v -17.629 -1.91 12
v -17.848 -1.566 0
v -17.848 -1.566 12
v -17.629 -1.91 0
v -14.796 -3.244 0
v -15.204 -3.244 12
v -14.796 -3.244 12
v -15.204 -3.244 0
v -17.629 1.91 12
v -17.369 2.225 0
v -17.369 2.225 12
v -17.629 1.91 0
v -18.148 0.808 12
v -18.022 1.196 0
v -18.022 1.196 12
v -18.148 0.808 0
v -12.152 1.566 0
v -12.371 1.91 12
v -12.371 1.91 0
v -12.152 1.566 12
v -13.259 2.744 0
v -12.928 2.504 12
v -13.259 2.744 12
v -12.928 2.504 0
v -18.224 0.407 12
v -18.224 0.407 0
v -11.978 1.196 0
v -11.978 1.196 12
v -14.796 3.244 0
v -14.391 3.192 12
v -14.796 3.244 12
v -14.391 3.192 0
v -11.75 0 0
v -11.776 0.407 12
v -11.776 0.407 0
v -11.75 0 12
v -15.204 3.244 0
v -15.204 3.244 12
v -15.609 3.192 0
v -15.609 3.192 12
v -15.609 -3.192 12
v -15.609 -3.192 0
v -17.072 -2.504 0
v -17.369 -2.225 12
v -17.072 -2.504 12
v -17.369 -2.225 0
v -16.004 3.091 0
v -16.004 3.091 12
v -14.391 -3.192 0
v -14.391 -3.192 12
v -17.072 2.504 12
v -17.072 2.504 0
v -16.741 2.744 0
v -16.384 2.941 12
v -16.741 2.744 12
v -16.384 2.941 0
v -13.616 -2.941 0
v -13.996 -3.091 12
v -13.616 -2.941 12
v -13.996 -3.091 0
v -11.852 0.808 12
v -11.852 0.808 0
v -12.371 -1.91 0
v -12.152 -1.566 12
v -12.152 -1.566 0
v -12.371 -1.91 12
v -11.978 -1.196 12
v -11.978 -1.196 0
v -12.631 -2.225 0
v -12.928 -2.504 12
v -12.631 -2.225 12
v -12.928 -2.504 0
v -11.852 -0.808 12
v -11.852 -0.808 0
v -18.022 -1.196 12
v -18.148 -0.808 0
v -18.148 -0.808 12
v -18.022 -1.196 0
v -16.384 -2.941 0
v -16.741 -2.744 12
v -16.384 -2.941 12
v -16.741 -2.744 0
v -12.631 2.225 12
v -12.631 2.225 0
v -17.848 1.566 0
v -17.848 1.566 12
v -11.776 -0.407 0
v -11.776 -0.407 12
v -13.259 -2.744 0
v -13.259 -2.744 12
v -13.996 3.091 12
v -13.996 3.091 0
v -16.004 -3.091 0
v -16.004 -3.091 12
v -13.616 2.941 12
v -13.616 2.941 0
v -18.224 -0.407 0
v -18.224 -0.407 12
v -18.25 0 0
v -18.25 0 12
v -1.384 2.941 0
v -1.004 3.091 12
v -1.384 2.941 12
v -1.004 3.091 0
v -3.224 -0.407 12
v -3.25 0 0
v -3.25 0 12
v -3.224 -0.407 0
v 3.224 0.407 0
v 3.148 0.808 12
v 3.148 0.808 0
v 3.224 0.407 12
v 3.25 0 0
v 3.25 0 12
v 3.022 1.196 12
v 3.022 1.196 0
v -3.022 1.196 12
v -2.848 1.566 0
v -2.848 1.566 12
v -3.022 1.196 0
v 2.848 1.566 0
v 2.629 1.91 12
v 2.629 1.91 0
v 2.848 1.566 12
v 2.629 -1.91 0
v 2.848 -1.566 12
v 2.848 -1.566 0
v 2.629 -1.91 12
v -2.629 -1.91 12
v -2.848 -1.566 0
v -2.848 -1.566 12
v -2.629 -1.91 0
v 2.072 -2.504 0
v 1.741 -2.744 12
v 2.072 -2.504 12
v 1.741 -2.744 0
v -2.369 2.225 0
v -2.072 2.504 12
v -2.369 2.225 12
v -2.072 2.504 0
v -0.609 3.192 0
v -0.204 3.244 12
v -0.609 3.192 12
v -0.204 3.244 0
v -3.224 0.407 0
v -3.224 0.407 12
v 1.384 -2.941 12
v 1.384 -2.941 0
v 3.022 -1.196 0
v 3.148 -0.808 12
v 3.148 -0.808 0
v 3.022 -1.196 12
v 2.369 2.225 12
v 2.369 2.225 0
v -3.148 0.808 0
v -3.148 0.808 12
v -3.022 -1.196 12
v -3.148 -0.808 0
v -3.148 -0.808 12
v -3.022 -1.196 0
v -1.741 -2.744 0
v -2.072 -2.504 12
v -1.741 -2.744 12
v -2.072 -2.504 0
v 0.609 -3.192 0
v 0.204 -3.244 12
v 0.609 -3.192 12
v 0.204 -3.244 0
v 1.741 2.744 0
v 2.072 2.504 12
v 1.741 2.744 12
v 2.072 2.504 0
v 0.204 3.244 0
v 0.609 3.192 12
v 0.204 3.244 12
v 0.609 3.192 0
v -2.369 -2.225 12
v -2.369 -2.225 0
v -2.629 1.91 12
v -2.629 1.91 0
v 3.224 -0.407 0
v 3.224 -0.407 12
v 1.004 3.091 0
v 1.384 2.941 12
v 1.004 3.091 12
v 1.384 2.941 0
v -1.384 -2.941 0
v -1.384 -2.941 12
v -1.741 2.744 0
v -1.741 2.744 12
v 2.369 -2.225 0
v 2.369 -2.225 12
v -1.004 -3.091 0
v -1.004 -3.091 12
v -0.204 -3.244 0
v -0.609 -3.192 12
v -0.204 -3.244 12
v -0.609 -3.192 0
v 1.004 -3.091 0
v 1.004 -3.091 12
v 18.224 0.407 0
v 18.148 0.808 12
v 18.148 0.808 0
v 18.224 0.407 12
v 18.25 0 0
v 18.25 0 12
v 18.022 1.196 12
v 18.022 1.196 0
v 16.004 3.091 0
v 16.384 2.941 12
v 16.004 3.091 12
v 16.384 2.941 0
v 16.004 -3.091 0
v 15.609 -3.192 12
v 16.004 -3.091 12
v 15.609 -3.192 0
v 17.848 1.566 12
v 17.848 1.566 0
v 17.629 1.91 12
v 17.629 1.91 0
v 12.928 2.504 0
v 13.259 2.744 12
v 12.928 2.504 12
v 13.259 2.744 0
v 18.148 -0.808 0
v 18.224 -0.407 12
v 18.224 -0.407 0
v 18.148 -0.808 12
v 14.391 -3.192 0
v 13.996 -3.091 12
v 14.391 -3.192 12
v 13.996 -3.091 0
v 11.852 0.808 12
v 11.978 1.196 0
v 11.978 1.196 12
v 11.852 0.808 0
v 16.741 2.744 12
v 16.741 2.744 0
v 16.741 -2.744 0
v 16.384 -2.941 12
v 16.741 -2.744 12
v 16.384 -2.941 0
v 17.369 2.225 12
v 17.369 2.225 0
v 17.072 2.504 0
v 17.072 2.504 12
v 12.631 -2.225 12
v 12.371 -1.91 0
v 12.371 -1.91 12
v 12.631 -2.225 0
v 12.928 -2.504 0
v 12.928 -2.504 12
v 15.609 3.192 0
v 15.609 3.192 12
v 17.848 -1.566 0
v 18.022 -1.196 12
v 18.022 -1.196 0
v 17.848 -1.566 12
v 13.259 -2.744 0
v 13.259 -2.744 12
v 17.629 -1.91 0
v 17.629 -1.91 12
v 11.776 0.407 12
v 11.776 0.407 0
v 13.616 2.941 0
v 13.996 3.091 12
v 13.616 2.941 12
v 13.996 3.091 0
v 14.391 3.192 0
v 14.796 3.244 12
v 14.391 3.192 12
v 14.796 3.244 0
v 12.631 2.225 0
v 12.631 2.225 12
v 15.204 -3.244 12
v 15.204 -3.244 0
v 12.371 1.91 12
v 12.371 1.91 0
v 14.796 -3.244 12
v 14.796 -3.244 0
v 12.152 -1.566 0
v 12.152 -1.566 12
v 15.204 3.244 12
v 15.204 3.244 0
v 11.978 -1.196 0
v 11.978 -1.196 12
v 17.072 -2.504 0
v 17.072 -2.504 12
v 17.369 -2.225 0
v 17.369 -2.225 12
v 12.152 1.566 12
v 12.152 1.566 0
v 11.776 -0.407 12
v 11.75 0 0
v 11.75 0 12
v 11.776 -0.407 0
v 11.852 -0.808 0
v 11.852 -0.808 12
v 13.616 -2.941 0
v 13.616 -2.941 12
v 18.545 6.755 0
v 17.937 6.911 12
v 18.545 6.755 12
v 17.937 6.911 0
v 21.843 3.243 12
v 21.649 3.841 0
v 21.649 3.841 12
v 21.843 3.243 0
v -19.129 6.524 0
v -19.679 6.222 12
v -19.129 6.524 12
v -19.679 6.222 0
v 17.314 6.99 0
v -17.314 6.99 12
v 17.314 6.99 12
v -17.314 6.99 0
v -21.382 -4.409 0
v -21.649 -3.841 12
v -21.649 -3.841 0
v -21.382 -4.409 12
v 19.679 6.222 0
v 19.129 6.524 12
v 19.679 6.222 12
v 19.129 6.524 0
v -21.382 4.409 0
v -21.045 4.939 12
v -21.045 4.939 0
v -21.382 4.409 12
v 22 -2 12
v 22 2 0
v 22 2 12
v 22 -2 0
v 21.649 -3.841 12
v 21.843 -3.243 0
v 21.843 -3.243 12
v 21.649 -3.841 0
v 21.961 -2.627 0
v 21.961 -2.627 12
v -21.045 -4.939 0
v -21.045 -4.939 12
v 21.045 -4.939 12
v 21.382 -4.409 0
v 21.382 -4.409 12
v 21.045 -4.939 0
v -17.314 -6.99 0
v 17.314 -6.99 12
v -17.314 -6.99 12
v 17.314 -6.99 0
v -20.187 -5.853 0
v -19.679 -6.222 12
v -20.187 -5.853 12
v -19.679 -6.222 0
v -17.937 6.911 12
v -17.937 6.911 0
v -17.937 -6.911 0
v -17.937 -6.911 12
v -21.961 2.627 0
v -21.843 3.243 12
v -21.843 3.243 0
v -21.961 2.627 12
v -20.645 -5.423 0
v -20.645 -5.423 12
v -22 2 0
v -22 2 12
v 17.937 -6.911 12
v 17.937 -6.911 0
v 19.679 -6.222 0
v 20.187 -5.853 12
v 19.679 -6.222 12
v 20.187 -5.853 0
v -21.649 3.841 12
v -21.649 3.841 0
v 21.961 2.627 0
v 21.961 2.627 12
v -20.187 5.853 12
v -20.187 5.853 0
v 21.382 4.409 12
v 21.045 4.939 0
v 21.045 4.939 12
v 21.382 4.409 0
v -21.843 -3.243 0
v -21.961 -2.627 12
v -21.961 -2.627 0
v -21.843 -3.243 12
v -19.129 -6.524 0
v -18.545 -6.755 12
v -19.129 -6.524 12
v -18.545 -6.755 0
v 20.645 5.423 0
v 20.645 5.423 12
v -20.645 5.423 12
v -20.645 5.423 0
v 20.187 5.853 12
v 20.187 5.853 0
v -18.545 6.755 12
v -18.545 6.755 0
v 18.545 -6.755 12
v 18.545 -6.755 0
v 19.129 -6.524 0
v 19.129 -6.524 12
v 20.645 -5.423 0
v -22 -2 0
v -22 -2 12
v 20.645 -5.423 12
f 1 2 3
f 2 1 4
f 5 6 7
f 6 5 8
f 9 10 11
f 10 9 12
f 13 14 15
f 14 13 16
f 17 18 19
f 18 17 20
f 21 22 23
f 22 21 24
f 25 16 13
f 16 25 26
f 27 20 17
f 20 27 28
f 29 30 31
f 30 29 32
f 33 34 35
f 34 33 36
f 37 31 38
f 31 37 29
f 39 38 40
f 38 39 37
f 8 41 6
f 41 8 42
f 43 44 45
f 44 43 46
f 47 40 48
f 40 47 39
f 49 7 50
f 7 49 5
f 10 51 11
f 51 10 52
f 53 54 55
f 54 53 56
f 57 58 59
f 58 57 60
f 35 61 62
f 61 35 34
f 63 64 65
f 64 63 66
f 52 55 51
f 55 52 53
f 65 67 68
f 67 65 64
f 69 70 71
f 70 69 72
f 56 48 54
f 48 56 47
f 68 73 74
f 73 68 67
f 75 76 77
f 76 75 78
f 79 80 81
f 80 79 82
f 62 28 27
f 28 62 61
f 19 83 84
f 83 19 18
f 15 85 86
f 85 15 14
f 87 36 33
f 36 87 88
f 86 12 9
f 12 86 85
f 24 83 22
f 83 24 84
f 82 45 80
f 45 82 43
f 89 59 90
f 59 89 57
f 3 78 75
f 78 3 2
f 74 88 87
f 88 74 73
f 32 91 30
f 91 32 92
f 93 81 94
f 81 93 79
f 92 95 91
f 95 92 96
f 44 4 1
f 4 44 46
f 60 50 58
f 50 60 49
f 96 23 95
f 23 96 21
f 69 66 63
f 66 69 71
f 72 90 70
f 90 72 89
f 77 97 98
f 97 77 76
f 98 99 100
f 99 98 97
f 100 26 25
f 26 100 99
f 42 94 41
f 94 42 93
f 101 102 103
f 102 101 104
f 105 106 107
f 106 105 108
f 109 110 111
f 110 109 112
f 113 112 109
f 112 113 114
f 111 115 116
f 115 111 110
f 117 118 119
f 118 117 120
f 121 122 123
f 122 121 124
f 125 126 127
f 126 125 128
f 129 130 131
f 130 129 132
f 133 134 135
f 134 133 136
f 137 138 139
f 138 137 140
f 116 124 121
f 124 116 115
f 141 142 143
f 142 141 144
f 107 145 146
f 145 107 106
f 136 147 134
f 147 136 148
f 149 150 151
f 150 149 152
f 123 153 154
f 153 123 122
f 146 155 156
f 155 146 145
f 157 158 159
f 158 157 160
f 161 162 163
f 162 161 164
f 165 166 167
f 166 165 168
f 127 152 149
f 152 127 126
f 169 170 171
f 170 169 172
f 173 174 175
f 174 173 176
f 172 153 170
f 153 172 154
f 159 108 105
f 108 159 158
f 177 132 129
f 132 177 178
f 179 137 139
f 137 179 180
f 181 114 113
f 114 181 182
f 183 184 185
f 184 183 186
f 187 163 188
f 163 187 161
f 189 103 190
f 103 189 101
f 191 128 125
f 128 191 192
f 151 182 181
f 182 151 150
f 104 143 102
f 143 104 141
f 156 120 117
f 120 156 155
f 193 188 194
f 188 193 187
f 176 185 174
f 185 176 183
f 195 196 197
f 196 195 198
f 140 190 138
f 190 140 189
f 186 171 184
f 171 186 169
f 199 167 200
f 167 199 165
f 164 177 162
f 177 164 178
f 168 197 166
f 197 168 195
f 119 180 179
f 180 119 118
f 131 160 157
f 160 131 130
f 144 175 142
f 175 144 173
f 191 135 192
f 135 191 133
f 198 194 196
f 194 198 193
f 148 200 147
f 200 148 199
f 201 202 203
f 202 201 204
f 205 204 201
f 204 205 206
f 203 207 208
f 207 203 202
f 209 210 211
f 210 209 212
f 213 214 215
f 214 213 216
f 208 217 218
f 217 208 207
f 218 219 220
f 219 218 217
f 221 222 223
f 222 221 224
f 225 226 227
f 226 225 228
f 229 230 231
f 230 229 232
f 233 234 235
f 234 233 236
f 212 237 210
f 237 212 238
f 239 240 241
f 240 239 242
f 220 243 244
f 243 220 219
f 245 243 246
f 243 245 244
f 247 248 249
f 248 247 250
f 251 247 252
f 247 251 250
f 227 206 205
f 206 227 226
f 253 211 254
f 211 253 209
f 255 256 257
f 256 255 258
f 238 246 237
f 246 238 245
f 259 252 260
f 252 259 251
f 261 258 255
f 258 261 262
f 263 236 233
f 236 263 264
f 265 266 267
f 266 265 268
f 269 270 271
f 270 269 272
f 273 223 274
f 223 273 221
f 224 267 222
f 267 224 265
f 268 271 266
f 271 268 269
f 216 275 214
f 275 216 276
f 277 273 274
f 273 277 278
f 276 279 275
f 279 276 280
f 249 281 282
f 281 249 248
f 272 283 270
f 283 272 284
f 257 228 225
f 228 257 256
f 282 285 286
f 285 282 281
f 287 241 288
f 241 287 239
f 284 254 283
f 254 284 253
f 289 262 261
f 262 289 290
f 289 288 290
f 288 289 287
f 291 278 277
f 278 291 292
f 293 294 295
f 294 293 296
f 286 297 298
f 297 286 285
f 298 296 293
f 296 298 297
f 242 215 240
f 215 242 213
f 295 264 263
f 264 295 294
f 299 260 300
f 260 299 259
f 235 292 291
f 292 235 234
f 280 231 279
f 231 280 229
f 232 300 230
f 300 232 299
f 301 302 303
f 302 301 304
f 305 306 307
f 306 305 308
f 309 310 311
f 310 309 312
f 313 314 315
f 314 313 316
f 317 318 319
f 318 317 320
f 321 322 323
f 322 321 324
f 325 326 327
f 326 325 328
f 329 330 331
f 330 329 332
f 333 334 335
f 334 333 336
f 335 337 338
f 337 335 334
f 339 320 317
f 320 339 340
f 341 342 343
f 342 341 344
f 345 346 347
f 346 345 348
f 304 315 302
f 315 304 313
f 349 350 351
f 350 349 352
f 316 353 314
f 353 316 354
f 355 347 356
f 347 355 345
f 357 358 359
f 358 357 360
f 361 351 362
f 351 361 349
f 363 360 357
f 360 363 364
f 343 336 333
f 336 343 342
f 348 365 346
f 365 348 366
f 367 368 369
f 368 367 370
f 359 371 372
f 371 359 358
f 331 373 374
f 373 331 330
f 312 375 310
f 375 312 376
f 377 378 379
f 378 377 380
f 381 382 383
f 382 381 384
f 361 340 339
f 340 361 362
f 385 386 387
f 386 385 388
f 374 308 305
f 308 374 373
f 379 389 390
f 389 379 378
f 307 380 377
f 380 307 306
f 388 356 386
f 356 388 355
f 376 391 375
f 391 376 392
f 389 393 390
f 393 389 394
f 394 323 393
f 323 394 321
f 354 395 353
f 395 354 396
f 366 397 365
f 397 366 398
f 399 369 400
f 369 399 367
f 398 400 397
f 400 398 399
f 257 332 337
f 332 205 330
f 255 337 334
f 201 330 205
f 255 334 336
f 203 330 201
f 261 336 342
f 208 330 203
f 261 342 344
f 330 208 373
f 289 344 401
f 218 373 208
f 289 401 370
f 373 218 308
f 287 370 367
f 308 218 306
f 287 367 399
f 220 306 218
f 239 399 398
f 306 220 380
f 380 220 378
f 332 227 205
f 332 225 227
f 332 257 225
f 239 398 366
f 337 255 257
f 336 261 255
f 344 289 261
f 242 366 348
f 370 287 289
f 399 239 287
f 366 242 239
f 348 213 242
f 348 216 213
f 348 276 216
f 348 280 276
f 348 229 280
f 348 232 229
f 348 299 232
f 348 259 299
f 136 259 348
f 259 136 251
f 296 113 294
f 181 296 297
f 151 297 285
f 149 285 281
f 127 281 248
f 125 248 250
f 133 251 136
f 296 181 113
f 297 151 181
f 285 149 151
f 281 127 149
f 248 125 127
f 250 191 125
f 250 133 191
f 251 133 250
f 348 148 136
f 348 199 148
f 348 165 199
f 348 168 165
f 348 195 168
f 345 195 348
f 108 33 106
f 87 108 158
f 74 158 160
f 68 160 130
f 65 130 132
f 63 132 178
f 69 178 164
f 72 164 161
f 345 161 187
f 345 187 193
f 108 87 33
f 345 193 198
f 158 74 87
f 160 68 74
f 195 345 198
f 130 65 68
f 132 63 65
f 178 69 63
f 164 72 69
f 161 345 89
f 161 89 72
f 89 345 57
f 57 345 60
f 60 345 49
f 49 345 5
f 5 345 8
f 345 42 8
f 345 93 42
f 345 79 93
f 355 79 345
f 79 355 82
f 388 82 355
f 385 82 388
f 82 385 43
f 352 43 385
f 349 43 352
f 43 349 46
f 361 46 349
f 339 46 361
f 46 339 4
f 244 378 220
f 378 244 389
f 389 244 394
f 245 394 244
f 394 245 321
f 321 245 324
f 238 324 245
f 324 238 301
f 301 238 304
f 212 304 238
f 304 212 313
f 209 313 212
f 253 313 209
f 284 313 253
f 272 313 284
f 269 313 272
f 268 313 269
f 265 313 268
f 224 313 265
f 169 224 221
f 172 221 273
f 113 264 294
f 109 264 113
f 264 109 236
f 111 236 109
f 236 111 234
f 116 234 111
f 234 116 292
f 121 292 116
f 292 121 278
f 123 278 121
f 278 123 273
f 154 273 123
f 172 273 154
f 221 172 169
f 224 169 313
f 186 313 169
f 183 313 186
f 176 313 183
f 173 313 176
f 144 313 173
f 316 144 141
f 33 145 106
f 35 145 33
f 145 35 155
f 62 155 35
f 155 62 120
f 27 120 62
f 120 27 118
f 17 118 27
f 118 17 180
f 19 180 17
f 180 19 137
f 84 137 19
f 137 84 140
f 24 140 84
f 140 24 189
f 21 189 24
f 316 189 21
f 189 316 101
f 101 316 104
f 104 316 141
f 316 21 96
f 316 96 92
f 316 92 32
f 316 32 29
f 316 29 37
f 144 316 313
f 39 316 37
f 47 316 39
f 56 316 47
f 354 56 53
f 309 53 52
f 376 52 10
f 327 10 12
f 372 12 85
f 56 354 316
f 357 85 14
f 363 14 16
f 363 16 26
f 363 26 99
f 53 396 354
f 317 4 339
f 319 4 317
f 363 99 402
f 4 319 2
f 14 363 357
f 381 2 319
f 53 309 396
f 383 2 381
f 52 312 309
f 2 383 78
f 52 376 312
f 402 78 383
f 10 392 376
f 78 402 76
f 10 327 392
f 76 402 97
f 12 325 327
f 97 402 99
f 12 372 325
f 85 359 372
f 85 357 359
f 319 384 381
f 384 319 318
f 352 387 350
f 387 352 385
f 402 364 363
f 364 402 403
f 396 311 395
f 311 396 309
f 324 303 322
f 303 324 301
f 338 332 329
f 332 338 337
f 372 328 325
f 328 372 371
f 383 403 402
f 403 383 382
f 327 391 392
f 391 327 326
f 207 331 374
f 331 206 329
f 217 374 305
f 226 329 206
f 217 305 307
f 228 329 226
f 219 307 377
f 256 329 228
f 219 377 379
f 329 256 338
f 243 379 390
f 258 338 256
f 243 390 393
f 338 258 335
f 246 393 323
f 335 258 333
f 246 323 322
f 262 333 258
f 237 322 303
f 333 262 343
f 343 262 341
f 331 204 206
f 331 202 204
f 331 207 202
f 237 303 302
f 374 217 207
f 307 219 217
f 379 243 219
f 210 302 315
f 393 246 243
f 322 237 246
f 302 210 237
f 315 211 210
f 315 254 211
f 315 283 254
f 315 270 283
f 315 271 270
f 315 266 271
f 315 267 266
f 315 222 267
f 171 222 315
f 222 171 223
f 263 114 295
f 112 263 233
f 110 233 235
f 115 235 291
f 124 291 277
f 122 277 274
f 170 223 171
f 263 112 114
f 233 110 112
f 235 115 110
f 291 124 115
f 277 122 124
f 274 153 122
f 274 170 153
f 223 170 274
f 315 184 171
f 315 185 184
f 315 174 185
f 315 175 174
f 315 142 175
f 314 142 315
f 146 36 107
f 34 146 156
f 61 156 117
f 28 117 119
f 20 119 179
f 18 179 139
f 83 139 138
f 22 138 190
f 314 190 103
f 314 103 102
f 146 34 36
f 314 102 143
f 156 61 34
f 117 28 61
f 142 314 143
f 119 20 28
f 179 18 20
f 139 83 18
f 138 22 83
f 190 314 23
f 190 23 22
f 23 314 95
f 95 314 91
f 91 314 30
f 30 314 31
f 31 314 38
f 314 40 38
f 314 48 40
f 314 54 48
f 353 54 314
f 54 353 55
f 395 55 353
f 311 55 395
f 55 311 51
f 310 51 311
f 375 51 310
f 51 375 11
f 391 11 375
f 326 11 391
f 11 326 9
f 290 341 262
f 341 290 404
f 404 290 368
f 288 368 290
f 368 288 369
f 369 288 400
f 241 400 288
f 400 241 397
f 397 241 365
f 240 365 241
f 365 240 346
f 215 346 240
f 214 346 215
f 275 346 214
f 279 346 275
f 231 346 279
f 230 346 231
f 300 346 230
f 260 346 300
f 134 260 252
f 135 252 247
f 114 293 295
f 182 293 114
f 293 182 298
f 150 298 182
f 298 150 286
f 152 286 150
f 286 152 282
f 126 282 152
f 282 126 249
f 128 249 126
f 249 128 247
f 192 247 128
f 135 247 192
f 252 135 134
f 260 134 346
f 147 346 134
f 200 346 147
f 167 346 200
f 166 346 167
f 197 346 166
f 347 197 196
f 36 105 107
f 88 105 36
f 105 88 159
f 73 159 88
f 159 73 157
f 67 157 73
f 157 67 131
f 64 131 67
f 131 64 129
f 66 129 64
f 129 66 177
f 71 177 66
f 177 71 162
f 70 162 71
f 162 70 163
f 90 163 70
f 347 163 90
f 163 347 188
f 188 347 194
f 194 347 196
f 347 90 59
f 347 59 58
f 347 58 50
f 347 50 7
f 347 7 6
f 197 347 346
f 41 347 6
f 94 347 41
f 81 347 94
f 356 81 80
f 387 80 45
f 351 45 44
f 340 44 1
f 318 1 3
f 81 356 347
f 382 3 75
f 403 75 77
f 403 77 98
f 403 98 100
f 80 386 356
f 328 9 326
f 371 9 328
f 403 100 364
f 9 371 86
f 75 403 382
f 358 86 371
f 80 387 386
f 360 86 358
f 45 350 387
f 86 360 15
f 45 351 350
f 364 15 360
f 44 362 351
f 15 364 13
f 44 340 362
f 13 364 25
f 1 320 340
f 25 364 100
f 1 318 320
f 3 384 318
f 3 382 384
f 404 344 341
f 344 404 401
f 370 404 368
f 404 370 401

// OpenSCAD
$fn = 50;


difference() {
	union() {
		hull() {
			translate(v = [-17.0000000000, 2.0000000000, 0]) {
				cylinder(h = 12, r = 5);
			}
			translate(v = [17.0000000000, 2.0000000000, 0]) {
				cylinder(h = 12, r = 5);
			}
			translate(v = [-17.0000000000, -2.0000000000, 0]) {
				cylinder(h = 12, r = 5);
			}
			translate(v = [17.0000000000, -2.0000000000, 0]) {
				cylinder(h = 12, r = 5);
			}
		}
	}
	union() {
		translate(v = [-15.0000000000, 0.0000000000, -100.0000000000]) {
			cylinder(h = 200, r = 3.2500000000);
		}
		translate(v = [0.0000000000, 0.0000000000, -100.0000000000]) {
			cylinder(h = 200, r = 3.2500000000);
		}
		translate(v = [15.0000000000, 0.0000000000, -100.0000000000]) {
			cylinder(h = 200, r = 3.2500000000);
		}
	}
}
